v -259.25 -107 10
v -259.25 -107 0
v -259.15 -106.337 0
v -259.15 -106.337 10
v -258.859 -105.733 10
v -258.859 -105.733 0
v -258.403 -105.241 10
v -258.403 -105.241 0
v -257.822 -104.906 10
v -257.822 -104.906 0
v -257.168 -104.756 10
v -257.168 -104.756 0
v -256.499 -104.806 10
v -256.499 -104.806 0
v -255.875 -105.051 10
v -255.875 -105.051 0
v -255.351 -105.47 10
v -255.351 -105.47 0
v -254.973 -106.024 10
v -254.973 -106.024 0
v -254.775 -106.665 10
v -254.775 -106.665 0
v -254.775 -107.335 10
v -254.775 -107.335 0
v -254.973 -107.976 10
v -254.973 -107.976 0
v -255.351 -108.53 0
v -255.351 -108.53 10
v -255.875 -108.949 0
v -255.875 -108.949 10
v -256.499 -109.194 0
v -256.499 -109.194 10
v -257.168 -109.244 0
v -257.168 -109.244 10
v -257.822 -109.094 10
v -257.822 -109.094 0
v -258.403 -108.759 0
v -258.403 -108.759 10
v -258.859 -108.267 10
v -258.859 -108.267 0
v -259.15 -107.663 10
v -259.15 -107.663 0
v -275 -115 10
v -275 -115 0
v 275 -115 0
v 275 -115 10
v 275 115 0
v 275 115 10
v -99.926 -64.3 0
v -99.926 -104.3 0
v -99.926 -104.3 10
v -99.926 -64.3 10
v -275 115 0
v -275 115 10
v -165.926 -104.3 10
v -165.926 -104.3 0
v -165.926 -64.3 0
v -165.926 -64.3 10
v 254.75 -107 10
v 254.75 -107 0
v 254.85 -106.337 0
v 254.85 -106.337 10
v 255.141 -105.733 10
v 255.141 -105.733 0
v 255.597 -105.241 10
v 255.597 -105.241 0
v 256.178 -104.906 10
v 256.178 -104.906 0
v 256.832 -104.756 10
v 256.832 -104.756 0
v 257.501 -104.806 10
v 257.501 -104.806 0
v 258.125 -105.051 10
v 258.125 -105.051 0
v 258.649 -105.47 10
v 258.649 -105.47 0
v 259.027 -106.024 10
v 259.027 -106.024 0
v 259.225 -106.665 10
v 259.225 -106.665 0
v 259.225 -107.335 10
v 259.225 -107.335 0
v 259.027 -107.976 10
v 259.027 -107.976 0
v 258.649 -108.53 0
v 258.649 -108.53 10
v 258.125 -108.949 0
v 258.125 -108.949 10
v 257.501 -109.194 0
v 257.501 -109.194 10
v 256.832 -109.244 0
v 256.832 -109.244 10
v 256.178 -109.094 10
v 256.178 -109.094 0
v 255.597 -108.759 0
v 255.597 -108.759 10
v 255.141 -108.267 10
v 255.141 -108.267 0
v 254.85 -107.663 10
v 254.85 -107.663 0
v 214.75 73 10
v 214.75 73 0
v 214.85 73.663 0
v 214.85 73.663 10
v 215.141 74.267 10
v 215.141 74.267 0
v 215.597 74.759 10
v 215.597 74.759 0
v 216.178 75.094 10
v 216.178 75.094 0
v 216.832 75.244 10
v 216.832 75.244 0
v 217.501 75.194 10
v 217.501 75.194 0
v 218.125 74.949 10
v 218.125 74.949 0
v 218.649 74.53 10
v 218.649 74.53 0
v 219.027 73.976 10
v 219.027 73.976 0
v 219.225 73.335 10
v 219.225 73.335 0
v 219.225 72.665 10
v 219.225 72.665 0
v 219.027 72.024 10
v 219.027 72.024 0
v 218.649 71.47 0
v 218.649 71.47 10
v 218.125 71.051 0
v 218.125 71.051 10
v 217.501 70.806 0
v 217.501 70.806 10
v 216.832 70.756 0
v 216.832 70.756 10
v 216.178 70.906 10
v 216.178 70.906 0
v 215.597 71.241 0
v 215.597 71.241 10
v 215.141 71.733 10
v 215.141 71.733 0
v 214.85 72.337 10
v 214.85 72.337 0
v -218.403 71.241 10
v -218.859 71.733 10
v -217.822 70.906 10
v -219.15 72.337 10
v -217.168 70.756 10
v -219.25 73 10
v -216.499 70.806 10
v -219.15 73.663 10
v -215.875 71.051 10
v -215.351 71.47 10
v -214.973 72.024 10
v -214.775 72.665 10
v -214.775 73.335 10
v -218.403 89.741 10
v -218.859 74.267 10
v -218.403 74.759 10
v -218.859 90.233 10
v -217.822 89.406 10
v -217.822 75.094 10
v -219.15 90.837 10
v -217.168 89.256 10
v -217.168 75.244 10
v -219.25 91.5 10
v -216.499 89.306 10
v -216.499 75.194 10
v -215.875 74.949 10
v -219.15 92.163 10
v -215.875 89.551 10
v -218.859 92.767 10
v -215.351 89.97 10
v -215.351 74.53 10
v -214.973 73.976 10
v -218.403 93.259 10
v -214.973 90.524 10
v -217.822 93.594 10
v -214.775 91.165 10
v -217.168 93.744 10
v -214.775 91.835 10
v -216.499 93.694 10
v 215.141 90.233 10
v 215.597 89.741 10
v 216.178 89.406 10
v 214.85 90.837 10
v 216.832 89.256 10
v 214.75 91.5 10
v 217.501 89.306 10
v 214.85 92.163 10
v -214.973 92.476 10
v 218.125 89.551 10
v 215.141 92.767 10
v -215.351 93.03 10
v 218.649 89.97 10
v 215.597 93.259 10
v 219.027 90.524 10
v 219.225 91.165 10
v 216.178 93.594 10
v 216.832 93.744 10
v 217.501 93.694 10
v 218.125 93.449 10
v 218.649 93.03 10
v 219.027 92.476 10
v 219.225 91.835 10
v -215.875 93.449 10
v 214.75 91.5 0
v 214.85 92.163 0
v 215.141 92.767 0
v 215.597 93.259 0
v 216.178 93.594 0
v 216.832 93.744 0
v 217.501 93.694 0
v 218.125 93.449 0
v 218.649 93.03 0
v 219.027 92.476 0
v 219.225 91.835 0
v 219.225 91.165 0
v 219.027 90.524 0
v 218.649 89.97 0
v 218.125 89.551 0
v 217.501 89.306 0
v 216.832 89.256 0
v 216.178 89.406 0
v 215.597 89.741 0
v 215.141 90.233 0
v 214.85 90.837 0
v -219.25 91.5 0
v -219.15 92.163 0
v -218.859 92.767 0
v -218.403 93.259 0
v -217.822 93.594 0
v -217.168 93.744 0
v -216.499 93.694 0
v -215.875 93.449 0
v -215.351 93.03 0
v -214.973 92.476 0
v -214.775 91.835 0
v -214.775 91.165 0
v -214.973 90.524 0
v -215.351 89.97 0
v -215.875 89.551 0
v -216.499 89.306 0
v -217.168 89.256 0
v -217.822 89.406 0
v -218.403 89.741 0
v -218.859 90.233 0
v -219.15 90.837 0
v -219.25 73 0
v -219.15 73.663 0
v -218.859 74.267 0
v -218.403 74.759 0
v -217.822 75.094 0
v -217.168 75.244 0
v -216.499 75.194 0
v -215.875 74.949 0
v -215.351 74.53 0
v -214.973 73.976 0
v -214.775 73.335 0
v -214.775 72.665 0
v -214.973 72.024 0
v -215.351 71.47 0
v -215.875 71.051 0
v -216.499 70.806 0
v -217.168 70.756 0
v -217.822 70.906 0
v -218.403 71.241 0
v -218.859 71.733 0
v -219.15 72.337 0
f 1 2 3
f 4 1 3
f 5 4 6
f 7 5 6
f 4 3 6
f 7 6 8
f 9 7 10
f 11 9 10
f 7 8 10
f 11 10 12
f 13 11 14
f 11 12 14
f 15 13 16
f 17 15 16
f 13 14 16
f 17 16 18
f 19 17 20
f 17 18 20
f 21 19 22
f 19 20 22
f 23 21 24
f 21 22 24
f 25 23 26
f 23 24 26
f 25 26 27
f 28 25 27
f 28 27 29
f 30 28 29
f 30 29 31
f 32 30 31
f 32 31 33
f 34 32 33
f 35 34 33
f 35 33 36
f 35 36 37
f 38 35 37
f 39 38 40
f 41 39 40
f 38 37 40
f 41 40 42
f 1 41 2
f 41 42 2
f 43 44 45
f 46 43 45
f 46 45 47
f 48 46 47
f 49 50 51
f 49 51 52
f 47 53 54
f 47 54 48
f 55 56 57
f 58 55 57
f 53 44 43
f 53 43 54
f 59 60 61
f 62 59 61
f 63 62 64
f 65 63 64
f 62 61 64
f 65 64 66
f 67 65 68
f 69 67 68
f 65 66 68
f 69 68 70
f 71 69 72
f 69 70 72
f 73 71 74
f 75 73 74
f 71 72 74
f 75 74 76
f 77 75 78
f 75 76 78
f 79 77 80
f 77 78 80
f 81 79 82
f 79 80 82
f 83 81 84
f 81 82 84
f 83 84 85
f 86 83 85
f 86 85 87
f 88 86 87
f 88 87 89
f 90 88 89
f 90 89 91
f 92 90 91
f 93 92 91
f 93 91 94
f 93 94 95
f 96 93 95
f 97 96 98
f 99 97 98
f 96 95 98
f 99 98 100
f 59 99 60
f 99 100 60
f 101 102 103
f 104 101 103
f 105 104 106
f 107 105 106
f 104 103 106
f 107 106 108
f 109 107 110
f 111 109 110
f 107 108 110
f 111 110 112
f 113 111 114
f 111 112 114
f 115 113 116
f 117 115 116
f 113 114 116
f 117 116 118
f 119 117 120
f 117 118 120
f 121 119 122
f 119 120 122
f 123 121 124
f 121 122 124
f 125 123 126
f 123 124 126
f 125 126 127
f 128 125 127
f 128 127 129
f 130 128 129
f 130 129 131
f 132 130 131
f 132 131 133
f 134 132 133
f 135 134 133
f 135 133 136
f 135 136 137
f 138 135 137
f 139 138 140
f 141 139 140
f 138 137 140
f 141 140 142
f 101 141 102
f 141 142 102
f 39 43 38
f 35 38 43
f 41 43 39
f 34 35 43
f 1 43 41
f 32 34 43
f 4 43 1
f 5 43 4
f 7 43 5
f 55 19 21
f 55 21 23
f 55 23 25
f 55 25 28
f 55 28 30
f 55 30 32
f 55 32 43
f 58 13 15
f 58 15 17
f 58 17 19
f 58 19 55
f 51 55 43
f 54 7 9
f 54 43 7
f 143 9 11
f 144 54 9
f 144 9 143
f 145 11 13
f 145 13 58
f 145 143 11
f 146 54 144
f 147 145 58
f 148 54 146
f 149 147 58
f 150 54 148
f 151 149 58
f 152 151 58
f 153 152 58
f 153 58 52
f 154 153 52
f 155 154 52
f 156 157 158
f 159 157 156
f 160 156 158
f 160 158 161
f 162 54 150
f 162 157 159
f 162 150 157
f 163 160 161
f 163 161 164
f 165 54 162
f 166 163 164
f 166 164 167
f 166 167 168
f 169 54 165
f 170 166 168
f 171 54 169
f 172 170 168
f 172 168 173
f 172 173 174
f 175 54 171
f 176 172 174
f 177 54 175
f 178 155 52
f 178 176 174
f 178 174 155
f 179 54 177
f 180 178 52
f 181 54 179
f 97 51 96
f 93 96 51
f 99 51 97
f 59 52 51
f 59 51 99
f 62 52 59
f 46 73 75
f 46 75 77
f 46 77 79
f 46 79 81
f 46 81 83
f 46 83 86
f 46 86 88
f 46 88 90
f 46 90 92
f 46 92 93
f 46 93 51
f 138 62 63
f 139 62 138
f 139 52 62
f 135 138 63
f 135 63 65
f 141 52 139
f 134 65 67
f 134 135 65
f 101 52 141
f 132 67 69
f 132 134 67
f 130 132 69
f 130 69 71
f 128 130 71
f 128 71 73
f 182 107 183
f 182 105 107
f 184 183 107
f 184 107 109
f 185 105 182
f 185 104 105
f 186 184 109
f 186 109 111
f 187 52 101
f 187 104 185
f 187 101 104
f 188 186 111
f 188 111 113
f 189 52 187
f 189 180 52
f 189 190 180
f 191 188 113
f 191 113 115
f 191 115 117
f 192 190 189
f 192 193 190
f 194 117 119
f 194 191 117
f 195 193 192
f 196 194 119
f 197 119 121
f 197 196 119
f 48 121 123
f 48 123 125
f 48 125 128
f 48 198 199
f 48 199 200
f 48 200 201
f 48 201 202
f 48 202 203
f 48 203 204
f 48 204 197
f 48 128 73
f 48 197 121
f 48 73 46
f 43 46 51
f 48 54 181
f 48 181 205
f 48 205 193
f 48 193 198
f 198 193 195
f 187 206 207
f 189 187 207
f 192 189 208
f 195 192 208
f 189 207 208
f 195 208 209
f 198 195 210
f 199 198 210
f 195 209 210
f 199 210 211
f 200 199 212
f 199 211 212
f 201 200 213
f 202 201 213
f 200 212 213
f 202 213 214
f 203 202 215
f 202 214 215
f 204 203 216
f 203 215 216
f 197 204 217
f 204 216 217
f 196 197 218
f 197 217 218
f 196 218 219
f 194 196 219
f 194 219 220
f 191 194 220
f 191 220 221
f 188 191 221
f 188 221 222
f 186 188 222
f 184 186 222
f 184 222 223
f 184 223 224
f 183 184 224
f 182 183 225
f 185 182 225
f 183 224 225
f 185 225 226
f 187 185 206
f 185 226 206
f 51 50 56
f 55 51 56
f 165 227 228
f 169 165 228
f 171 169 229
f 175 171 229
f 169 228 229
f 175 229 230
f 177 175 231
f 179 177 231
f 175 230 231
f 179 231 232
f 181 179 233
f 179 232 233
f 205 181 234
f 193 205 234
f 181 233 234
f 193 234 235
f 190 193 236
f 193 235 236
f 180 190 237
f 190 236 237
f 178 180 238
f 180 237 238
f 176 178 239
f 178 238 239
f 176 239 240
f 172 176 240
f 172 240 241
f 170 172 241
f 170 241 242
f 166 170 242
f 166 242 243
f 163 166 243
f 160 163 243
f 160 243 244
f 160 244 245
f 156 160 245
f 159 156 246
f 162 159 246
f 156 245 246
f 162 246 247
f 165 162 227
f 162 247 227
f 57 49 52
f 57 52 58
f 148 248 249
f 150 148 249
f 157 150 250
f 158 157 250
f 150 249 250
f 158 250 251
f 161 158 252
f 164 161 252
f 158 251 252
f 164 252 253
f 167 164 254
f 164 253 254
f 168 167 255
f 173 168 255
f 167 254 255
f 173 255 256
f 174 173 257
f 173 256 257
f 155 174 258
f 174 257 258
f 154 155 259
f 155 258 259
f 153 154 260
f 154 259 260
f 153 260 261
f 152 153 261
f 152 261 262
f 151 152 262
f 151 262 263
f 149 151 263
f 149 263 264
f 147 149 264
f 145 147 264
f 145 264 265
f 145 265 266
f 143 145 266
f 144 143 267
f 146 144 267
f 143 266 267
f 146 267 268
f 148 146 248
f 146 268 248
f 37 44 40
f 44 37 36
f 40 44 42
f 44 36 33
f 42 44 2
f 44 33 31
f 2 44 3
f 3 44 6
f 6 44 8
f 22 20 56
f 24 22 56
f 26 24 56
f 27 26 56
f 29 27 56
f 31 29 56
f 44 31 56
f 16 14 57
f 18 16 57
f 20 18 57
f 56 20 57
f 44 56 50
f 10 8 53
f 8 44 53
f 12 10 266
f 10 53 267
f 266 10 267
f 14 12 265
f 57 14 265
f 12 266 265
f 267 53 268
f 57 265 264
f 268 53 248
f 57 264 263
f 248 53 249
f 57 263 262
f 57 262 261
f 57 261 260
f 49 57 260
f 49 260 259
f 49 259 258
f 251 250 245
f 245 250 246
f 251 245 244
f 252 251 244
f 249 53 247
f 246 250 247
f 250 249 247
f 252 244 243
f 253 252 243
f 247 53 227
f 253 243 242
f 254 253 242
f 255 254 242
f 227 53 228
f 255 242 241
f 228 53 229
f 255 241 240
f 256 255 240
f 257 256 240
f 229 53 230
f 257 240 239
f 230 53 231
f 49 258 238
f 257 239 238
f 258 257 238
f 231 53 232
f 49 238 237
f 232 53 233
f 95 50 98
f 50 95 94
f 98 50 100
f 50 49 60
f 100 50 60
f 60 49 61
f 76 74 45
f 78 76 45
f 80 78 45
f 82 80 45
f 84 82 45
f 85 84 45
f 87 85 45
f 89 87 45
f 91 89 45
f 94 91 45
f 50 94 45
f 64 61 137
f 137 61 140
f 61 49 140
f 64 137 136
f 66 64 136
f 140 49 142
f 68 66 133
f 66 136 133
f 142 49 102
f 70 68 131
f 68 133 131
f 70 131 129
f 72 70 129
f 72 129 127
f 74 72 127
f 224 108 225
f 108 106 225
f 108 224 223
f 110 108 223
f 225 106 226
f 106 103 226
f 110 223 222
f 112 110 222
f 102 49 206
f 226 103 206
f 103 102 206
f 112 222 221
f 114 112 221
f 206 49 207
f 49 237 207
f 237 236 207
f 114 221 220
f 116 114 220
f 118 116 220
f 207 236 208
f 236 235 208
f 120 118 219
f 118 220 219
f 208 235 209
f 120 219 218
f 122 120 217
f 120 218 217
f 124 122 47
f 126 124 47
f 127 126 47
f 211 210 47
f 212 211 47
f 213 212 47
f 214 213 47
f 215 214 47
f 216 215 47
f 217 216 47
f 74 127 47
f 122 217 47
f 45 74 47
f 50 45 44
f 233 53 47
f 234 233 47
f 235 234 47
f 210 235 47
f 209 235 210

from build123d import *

# Parameters (mm, degrees)
SCHIZZO1_W                   = 550
SCHIZZO1_H                   = 230
ESTRUSIONE_ESTRUSIONE1_DEPTH = 10
SCHIZZO2_R                   = 2.25
SCHIZZO2_W                   = 66
SCHIZZO2_H                   = 40
TAGLIO_ESTRUSIONE1_DEPTH     = 10


with BuildPart() as part:
    # Schizzo1 → Estrusione-Estrusione1 (new body)
    with BuildSketch(Plane.XY):
        Rectangle(SCHIZZO1_W, SCHIZZO1_H)
    extrude(amount=ESTRUSIONE_ESTRUSIONE1_DEPTH)

    # Schizzo2 → Taglio-Estrusione1 (cut)
    with BuildSketch(Plane(origin=(0, 0, 0), x_dir=(-1, 0, 0), z_dir=(0, 0, -1))):
        with Locations((-217, 91.5)):
            Circle(SCHIZZO2_R)
        with Locations((-217, 73)):
            Circle(SCHIZZO2_R)
        with Locations((217, 91.5)):
            Circle(SCHIZZO2_R)
        with Locations((217, 73)):
            Circle(SCHIZZO2_R)
        with Locations((-257, -107)):
            Circle(SCHIZZO2_R)
        with Locations((257, -107)):
            Circle(SCHIZZO2_R)
        with Locations((132.925688, -84.3)):
            Rectangle(SCHIZZO2_W, SCHIZZO2_H)
    extrude(amount=-TAGLIO_ESTRUSIONE1_DEPTH, mode=Mode.SUBTRACT)


solid = part.part
